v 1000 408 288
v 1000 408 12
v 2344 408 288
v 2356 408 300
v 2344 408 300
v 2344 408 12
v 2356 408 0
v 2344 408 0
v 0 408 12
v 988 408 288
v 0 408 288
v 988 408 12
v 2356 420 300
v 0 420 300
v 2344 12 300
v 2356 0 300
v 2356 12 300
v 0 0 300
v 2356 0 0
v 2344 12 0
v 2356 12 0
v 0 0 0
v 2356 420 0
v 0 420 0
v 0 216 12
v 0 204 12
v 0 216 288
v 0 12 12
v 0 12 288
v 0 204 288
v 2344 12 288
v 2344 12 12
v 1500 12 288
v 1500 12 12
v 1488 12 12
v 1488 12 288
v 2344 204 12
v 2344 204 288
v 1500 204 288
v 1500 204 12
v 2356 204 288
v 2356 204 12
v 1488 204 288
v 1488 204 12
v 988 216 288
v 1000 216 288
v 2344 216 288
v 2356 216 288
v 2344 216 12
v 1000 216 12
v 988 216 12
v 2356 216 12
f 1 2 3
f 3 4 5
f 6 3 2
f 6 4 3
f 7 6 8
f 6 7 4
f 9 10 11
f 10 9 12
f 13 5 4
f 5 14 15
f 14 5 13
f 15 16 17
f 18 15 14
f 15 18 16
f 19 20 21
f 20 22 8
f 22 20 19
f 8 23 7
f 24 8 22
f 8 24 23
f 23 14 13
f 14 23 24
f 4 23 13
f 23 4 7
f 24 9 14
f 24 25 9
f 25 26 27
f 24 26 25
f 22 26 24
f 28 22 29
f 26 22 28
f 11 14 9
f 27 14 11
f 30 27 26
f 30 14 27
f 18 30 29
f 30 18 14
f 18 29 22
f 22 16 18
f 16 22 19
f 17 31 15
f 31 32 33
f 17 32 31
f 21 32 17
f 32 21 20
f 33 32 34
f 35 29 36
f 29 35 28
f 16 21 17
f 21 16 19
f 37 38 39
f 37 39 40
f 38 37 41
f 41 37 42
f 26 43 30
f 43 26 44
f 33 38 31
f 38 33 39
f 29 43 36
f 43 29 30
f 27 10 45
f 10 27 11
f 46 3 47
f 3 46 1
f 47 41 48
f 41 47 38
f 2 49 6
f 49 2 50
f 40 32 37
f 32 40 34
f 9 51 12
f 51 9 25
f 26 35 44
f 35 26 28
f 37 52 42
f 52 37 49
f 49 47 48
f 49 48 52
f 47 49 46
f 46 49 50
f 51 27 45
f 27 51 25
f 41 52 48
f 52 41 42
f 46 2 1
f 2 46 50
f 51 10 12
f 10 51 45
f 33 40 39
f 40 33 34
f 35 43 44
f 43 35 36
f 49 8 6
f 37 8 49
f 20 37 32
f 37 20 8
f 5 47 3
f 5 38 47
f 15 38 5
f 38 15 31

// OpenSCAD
/*

    Middle Storage Unit
    
    By Anton Augustsson


*/



module middleStorageUnit (
    thickness,
    length,
    width,
    height,
    x,y,z,
    zRotate
    ){
/*
    ---------- Local varibles ---------- 
*/


/*
    ---------- Code ---------- 
*/

translate([
    x,
    y,
    z]) 
rotate([0,0,zRotate])
union () {

// Left
color("Wheat")
translate([
    0,
    0,
    0]) 
cube(size = [
    thickness,
    length,
    height]);

// Right
color("Wheat")
translate([
    width-thickness,
    0,
    0]) 
cube(size = [
    thickness,
    length,
    height]);


// Divider
color("Wheat")
translate([
    (width-thickness)/2,
    0,
    thickness]) 
cube(size = [
    thickness,
    length,
    height-thickness*2]);
    
    
// Middle Left Divider
color("Wheat")
translate([
    thickness,
    1000-thickness,
    0]) 
cube(size = [
    width/2-thickness/2*3,
    thickness,
    height-thickness]);

// Middle Left Divider
color("Wheat")
translate([
    thickness*2+(width/2-thickness/2*3),
    1500-thickness,
    0]) 
cube(size = [
    width/2-thickness/2*3,
    thickness,
    height-thickness]);


// Bottom 
color("Wheat")
translate([
    thickness,
    0,
    0]) 
cube(size = [
    width-thickness*2,
    length-thickness,
    thickness]);

// Top
color("BurlyWood")
translate([
    thickness,
    0,
    height-thickness]) 
cube(size = [
    width-thickness*2,
    length-thickness,
    thickness]);    


}}
    
/*
    ---------- Example ---------- 
*/

standardSheathingWidth = 1220; 
standardSheathingLength = 2440;

mdfTopThickness = 19;
plywoodTopThickness = 12;

// Side protection for ply and mdf
edgeTopThickness = 20; 
edgeTopWidth = 167;
edgeTopLengthX = standardSheathingLength
    +2*edgeTopThickness;
edgeTopLengthY = standardSheathingWidth
    +2*edgeTopThickness;

// 4 list betweend mdf and ply (Pine)
listTopThickness = 20; 
listTopWidth = 80;
listTopLengthX = standardSheathingLength/4
    -listTopThickness;
listTopLengthY = standardSheathingWidth;

// 6 legs (Pine)
legLength = 900
    -plywoodTopThickness
    -mdfTopThickness
    -listTopWidth;
legWidth = 69;
legThickness = 42;

// 3 bottom list (Pine)
listBottomThickness = 20; 
listBottomWidth1 = 60;
listBottomWidth2 = listBottomWidth1
    -plywoodTopThickness;
listBottomLengthX = standardSheathingLength;
listBottomLengthY = standardSheathingWidth;
listBottomLengthY2 = standardSheathingWidth
    +listBottomThickness*2;
bottomHeight = 100;

storageUnitLength=standardSheathingLength/2
    -legThickness*3/2;
storageUnitWidth=400;  
storageUnitHeight=(900-edgeTopWidth)
    -(bottomHeight+listBottomWidth2);
storageUnitThickness=12;


thickness= 12;

length = 500;
width  = 600;
height = 400;

x=0;
y=standardSheathingWidth
    -storageUnitWidth*2;
z=0;
zRotate=-90;

middleStorageUnit (
    thickness,
    standardSheathingLength-legThickness*2,
    standardSheathingWidth
    -storageUnitWidth*2,
    300,
    x,y,z,
    zRotate
    );
